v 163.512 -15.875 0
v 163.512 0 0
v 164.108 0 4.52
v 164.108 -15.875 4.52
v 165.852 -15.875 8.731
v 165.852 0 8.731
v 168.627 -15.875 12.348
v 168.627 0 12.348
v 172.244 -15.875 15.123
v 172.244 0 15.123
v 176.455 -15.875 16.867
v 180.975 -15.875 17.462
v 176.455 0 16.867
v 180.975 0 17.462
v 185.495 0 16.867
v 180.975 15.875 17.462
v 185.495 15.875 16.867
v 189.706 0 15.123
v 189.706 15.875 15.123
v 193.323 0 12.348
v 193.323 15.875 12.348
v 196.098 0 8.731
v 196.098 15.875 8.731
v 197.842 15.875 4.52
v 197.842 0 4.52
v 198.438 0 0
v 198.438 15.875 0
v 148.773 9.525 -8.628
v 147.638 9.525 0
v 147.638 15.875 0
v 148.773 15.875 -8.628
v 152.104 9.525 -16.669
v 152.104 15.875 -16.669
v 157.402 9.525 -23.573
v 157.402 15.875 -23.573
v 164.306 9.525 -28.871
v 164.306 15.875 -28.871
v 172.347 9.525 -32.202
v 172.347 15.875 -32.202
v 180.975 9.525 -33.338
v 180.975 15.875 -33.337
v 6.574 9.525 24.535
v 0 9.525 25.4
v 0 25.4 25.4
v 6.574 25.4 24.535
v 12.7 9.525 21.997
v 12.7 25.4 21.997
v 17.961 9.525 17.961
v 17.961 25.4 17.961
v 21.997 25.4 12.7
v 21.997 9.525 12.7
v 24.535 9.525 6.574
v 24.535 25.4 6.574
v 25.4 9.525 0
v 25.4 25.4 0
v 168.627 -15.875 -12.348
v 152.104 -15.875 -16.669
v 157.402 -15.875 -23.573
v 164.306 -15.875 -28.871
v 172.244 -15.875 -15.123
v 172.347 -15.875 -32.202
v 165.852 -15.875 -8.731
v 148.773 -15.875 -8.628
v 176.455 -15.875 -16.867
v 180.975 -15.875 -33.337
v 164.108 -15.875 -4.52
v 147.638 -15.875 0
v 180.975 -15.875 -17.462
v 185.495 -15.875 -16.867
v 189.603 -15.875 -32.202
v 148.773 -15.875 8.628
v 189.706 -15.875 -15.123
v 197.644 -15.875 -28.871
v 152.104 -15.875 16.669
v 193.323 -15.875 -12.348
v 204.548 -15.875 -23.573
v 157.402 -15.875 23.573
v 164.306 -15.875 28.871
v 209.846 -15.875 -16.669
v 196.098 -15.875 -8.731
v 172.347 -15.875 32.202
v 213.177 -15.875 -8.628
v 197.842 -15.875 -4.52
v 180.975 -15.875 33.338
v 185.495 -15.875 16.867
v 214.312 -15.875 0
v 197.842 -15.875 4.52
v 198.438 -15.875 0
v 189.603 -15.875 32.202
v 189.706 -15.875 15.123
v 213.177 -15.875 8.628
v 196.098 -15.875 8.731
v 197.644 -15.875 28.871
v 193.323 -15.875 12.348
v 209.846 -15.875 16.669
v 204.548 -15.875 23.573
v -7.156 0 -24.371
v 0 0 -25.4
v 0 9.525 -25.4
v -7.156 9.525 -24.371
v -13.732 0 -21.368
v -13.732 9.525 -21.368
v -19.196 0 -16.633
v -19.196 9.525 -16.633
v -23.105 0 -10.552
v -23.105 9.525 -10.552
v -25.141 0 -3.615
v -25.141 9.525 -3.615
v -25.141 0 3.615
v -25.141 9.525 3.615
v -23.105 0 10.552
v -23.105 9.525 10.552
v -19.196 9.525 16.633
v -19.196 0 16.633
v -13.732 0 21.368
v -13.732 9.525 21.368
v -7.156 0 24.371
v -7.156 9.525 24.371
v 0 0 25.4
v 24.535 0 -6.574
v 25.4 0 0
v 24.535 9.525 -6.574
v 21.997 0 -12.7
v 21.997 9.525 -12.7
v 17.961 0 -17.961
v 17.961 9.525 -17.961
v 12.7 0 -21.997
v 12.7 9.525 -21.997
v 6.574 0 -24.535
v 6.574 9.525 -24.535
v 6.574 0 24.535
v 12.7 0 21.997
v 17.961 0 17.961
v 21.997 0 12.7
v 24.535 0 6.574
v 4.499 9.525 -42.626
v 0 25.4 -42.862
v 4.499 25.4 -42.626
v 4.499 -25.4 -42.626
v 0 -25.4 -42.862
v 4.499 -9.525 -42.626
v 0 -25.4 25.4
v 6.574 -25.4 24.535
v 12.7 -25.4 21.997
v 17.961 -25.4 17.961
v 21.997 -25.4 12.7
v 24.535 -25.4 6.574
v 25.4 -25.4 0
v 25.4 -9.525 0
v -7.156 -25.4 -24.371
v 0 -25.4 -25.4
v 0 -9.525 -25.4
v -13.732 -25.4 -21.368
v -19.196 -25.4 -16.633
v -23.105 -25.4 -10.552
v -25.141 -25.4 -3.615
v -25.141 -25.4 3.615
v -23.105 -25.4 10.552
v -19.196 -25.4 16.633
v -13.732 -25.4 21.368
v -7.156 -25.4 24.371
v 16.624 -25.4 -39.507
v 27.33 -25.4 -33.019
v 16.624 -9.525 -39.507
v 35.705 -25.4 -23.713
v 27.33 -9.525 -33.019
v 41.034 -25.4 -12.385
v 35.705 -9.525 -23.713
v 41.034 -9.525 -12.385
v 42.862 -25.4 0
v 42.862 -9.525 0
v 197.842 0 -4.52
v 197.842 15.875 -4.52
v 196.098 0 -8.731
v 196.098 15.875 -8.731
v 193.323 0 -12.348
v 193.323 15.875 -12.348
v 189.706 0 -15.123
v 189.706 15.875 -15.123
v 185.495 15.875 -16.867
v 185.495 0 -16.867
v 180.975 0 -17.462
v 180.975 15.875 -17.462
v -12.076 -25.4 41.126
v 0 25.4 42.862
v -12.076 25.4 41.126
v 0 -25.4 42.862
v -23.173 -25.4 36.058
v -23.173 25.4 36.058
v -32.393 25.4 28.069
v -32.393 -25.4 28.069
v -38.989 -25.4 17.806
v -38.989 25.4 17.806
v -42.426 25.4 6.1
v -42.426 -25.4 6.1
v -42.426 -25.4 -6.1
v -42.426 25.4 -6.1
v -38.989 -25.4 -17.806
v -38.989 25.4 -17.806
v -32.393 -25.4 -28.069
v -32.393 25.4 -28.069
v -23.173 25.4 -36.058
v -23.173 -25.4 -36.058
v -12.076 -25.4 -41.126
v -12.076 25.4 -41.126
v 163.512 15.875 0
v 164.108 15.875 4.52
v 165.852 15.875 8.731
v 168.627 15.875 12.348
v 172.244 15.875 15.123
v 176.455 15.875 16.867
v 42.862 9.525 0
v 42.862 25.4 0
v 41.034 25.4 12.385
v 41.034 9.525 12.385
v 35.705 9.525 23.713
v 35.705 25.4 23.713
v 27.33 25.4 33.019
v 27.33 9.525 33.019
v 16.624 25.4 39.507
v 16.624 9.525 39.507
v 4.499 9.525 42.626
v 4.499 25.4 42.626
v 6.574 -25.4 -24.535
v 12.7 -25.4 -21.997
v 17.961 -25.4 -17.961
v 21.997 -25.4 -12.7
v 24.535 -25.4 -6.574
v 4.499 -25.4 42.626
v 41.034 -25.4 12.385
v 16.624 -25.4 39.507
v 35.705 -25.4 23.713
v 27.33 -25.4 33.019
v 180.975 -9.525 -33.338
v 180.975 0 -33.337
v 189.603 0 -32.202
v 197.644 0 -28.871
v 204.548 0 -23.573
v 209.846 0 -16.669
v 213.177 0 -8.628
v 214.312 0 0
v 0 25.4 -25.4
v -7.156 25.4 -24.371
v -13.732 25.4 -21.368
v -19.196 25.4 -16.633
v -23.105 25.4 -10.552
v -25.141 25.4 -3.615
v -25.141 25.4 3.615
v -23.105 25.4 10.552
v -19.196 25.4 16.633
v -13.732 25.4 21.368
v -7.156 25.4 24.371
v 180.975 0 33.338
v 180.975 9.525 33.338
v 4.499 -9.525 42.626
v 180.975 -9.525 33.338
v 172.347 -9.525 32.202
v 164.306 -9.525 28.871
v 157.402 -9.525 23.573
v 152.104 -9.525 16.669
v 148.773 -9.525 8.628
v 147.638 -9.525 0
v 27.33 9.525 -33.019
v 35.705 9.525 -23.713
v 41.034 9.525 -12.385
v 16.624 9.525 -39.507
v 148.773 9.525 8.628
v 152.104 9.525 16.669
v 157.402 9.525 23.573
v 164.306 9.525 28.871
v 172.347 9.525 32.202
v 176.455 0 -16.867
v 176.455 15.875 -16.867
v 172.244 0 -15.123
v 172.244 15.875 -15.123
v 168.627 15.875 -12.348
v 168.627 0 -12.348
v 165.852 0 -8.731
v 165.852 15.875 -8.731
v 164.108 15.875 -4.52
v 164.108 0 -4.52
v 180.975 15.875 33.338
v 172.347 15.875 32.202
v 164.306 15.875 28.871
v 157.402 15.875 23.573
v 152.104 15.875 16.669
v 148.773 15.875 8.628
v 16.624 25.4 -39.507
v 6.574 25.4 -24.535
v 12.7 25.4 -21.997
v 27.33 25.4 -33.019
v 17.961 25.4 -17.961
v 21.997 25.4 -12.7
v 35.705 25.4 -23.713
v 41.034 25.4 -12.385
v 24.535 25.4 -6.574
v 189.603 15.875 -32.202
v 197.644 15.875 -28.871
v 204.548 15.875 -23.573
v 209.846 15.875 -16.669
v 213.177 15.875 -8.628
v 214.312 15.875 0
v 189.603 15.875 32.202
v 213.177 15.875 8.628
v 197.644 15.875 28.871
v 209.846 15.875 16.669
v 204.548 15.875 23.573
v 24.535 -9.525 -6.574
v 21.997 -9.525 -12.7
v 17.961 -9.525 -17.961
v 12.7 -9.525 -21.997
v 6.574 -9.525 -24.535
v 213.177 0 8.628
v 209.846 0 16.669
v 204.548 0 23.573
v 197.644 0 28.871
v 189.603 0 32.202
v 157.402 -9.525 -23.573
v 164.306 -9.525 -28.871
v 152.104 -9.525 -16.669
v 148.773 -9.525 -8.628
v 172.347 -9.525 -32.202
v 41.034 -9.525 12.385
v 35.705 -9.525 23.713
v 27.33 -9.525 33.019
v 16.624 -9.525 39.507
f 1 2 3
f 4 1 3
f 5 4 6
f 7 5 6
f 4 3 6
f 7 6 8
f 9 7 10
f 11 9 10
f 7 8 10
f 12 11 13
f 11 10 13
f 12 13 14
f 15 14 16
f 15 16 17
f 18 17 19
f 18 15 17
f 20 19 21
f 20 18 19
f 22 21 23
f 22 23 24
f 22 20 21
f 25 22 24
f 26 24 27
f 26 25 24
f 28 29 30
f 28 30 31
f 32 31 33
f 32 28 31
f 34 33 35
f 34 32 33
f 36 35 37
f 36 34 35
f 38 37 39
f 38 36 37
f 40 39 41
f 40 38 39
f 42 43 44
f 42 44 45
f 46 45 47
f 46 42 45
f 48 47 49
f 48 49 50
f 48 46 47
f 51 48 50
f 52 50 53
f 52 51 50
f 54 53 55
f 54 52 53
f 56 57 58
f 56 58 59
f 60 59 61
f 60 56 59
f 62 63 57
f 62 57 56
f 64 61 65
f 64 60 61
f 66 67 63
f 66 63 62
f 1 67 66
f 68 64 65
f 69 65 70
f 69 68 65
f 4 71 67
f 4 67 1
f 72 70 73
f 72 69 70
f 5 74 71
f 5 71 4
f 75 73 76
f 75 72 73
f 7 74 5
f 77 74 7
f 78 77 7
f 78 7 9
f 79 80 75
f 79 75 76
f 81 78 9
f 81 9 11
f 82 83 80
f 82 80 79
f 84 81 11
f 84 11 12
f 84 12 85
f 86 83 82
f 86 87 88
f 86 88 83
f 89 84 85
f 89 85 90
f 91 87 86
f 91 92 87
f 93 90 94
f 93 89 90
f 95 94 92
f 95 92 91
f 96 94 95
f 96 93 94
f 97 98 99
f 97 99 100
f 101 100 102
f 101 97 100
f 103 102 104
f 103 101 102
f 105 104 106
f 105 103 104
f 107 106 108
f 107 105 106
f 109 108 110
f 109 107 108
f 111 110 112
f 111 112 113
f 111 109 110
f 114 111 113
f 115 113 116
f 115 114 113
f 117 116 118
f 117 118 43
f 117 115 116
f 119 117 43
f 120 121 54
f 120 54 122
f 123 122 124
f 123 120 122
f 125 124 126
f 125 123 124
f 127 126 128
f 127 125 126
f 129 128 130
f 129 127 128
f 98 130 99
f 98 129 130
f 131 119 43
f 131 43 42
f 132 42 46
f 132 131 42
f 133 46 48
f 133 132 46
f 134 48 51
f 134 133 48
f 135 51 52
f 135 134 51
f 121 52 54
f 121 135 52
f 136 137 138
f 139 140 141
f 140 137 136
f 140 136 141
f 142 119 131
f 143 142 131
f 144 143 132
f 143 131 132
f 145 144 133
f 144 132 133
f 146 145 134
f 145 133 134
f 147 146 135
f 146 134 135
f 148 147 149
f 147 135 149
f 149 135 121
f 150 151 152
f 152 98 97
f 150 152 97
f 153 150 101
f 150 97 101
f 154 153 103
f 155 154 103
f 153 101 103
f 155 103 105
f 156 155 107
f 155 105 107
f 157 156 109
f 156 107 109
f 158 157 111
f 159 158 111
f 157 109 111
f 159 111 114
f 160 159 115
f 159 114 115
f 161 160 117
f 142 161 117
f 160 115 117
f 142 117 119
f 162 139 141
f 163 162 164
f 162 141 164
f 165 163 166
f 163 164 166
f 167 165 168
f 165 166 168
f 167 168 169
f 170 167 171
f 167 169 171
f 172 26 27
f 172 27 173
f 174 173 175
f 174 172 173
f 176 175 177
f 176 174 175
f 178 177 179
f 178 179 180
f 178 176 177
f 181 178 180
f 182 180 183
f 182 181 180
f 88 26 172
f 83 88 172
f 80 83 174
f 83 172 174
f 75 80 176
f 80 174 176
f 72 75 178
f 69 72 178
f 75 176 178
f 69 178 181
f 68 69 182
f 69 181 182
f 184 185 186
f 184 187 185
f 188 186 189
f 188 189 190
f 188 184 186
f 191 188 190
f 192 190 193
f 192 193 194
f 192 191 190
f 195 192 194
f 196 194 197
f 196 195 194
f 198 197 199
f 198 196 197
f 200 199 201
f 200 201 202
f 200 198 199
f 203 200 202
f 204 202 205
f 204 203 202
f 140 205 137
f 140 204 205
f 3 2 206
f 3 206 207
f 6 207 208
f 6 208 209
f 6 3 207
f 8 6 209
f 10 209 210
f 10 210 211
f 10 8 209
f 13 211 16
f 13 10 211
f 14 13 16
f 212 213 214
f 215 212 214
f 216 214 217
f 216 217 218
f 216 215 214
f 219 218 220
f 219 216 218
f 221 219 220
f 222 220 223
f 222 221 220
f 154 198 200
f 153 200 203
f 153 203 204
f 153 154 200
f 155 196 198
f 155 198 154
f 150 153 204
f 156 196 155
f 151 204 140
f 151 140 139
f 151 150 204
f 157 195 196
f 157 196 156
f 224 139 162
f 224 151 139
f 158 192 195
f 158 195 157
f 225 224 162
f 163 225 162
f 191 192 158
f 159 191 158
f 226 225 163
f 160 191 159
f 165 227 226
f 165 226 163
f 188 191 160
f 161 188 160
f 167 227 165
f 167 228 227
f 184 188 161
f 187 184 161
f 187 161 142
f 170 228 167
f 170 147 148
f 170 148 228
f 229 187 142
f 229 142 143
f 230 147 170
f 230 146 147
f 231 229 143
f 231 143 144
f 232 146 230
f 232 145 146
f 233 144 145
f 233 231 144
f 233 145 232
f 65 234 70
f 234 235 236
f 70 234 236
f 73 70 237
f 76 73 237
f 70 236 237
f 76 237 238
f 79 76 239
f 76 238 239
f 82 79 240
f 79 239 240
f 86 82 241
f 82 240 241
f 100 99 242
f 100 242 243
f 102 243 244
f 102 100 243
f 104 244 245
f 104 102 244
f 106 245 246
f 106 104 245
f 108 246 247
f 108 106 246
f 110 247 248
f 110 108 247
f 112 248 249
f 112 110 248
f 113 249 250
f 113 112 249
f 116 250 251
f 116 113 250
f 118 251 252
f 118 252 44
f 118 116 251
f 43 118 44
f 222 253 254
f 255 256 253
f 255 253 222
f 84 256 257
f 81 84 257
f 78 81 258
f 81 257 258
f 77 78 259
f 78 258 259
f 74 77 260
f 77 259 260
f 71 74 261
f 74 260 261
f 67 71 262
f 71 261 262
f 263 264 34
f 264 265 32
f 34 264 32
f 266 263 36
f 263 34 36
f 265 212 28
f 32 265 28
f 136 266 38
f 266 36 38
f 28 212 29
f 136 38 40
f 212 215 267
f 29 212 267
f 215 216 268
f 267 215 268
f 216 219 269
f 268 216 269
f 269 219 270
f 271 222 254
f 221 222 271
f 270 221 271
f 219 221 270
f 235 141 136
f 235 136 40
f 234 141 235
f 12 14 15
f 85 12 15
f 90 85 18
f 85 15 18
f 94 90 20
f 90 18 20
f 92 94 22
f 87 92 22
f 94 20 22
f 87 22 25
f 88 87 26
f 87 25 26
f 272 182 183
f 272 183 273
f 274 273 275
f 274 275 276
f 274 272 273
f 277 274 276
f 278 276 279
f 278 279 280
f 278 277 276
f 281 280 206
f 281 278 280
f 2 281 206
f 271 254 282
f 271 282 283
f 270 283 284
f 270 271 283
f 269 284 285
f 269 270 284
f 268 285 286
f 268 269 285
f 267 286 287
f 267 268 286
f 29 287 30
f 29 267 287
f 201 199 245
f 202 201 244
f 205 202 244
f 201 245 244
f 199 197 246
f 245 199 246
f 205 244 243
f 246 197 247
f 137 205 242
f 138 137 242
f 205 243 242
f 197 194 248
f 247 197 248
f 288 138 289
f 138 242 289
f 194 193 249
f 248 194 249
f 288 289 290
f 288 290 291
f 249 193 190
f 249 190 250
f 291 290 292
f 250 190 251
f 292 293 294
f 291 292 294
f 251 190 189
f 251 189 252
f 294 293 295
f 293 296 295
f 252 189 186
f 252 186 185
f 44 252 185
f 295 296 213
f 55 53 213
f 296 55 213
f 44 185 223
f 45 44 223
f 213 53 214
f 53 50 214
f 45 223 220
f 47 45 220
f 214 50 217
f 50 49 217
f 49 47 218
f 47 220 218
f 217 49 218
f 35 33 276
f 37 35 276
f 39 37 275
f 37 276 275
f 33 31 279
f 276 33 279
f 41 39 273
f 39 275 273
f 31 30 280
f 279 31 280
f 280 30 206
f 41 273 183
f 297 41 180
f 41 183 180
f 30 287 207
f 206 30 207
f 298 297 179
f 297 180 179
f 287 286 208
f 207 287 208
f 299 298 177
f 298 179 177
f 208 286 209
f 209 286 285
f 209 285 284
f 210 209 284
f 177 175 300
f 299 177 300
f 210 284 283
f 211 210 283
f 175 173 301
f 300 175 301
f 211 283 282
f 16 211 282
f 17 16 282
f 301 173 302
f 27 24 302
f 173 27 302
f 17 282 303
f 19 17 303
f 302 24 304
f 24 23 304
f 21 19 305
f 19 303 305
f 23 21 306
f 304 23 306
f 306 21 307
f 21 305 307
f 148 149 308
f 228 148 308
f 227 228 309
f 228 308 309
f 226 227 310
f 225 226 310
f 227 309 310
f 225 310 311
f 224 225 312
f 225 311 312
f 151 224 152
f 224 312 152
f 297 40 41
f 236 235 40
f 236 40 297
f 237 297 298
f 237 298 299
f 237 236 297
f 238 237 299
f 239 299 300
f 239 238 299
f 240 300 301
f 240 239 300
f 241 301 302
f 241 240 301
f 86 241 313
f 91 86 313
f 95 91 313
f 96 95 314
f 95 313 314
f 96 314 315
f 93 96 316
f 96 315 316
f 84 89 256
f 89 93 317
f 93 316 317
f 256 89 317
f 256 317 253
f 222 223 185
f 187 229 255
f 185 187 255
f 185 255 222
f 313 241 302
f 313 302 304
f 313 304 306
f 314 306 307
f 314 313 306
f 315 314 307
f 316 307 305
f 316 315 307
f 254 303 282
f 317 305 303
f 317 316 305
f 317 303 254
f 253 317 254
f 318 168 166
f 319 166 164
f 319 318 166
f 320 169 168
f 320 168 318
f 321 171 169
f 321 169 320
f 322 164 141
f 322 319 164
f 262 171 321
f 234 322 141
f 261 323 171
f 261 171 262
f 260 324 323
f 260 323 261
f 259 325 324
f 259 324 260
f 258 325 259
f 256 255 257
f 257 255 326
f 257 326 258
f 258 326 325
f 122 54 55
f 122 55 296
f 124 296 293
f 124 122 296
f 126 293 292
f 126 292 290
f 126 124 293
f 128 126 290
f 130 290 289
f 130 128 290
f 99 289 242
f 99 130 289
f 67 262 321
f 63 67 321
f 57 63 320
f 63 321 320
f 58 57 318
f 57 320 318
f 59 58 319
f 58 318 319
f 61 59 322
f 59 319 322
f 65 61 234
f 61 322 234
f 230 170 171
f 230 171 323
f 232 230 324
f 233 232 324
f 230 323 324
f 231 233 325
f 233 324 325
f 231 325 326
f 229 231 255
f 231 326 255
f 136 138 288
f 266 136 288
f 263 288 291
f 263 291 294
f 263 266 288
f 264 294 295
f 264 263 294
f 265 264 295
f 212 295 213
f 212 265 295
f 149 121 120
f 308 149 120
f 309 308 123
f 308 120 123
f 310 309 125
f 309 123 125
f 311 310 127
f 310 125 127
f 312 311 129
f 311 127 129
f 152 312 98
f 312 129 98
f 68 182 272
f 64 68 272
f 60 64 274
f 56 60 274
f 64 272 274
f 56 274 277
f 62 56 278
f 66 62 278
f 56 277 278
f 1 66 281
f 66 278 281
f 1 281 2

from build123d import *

# Parameters (mm, degrees)
F1_DEPTH = 25.4
F2_DEPTH = 25.4
F3_DEPTH = 9.525
F4_DEPTH = 9.525
F5_DEPTH = 15.875
F6_DEPTH = 15.875


with BuildPart() as f1:
    # F0 (on Front) → F1 (new body)
    with BuildSketch(Plane.XZ):
        with BuildLine():
            Line((0, 25.4), (0, 42.8625))
            ThreePointArc((0, 42.8625), (-42.8625, 0), (0, -42.8625))
            Line((0, -42.8625), (0, -25.4))
            ThreePointArc((0, -25.4), (-25.4, 0), (0, 25.4))
        make_face()
        with BuildLine():
            Line((4.499378453, 42.6256906077), (0, 42.8625))
            Line((0, 42.8625), (0, 25.4))
            ThreePointArc((0, 25.4), (17.9605122421, 17.9605122421), (25.4, 0))
            Line((25.4, 0), (42.8625, 0))
            ThreePointArc((42.8625, 0), (31.8594453435, 28.6735008092), (4.499378453, 42.6256906077))
        make_face()
        with BuildLine():
            Line((0, -25.4), (0, -42.8625))
            Line((0, -42.8625), (4.499378453, -42.6256906077))
            ThreePointArc((4.499378453, -42.6256906077), (31.8594453435, -28.6735008092), (42.8625, 0))
            Line((42.8625, 0), (25.4, 0))
            ThreePointArc((25.4, 0), (17.9605122421, -17.9605122421), (0, -25.4))
        make_face()
    extrude(amount=F1_DEPTH)

    # F2 (add): a face of the model
    f2_faces = [f1.faces().sort_by_distance(p)[0] for p in [
        (-41.6501654237, 0, 0),
    ]]
    extrude(f2_faces, amount=F2_DEPTH)

    # F0 (on Front) → F3 (join)
    with BuildSketch(Plane.XZ):
        with BuildLine():
            Line((0, -25.4), (0, -42.8625))
            Line((0, -42.8625), (4.499378453, -42.6256906077))
            ThreePointArc((4.499378453, -42.6256906077), (31.8594453435, -28.6735008092), (42.8625, 0))
            Line((42.8625, 0), (25.4, 0))
            ThreePointArc((25.4, 0), (17.9605122421, -17.9605122421), (0, -25.4))
        make_face()
        with BuildLine():
            Line((180.975, 33.3375), (4.499378453, 42.6256906077))
            ThreePointArc((4.499378453, 42.6256906077), (31.8594453435, 28.6735008092), (42.8625, 0))
            Line((42.8625, 0), (147.6375, 0))
            ThreePointArc((147.6375, 0), (157.4018276822, 23.5731723178), (180.975, 33.3375))
        make_face()
        with BuildLine():
            ThreePointArc((42.8625, 0), (31.8594453435, -28.6735008092), (4.499378453, -42.6256906077))
            Line((4.499378453, -42.6256906077), (180.975, -33.3375))
            ThreePointArc((180.975, -33.3375), (157.4018276822, -23.5731723178), (147.6375, 0))
            Line((147.6375, 0), (42.8625, 0))
        make_face()
    extrude(amount=F3_DEPTH)

    # F0 (on Front) → F4 (join)
    with BuildSketch(Plane.XZ):
        with BuildLine():
            Line((0, 25.4), (0, 42.8625))
            ThreePointArc((0, 42.8625), (-42.8625, 0), (0, -42.8625))
            Line((0, -42.8625), (0, -25.4))
            ThreePointArc((0, -25.4), (-25.4, 0), (0, 25.4))
        make_face()
        with BuildLine():
            Line((4.499378453, 42.6256906077), (0, 42.8625))
            Line((0, 42.8625), (0, 25.4))
            ThreePointArc((0, 25.4), (17.9605122421, 17.9605122421), (25.4, 0))
            Line((25.4, 0), (42.8625, 0))
            ThreePointArc((42.8625, 0), (31.8594453435, 28.6735008092), (4.499378453, 42.6256906077))
        make_face()
        with BuildLine():
            Line((0, -25.4), (0, -42.8625))
            Line((0, -42.8625), (4.499378453, -42.6256906077))
            ThreePointArc((4.499378453, -42.6256906077), (31.8594453435, -28.6735008092), (42.8625, 0))
            Line((42.8625, 0), (25.4, 0))
            ThreePointArc((25.4, 0), (17.9605122421, -17.9605122421), (0, -25.4))
        make_face()
        with BuildLine():
            Line((180.975, 33.3375), (4.499378453, 42.6256906077))
            ThreePointArc((4.499378453, 42.6256906077), (31.8594453435, 28.6735008092), (42.8625, 0))
            Line((42.8625, 0), (147.6375, 0))
            ThreePointArc((147.6375, 0), (157.4018276822, 23.5731723178), (180.975, 33.3375))
        make_face()
        with BuildLine():
            ThreePointArc((42.8625, 0), (31.8594453435, -28.6735008092), (4.499378453, -42.6256906077))
            Line((4.499378453, -42.6256906077), (180.975, -33.3375))
            ThreePointArc((180.975, -33.3375), (157.4018276822, -23.5731723178), (147.6375, 0))
            Line((147.6375, 0), (42.8625, 0))
        make_face()
    extrude(amount=-F4_DEPTH)

    # F0 (on Front) → F5 (join)
    with BuildSketch(Plane.XZ):
        with BuildLine():
            ThreePointArc((147.6375, 0), (157.4018276822, -23.5731723178), (180.975, -33.3375))
            Line((180.975, -33.3375), (180.975, -17.4625))
            ThreePointArc((180.975, -17.4625), (168.6271478335, -12.3478521665), (163.5125, 0))
            Line((163.5125, 0), (147.6375, 0))
        make_face()
        with BuildLine():
            Line((180.975, 17.4625), (180.975, 33.3375))
            ThreePointArc((180.975, 33.3375), (157.4018276822, 23.5731723178), (147.6375, 0))
            Line((147.6375, 0), (163.5125, 0))
            ThreePointArc((163.5125, 0), (168.6271478335, 12.3478521665), (180.975, 17.4625))
        make_face()
        with BuildLine():
            ThreePointArc((214.3125, 0), (204.5481723178, 23.5731723178), (180.975, 33.3375))
            Line((180.975, 33.3375), (180.975, 17.4625))
            ThreePointArc((180.975, 17.4625), (193.3228521665, 12.3478521665), (198.4375, 0))
            ThreePointArc((198.4375, 0), (193.3228521665, -12.3478521665), (180.975, -17.4625))
            Line((180.975, -17.4625), (180.975, -33.3375))
            ThreePointArc((180.975, -33.3375), (204.5481723178, -23.5731723178), (214.3125, 0))
        make_face()
    extrude(amount=F5_DEPTH)

    # F0 (on Front) → F6 (join)
    with BuildSketch(Plane.XZ):
        with BuildLine():
            ThreePointArc((147.6375, 0), (157.4018276822, -23.5731723178), (180.975, -33.3375))
            Line((180.975, -33.3375), (180.975, -17.4625))
            ThreePointArc((180.975, -17.4625), (168.6271478335, -12.3478521665), (163.5125, 0))
            Line((163.5125, 0), (147.6375, 0))
        make_face()
        with BuildLine():
            Line((180.975, 17.4625), (180.975, 33.3375))
            ThreePointArc((180.975, 33.3375), (157.4018276822, 23.5731723178), (147.6375, 0))
            Line((147.6375, 0), (163.5125, 0))
            ThreePointArc((163.5125, 0), (168.6271478335, 12.3478521665), (180.975, 17.4625))
        make_face()
        with BuildLine():
            ThreePointArc((214.3125, 0), (204.5481723178, 23.5731723178), (180.975, 33.3375))
            Line((180.975, 33.3375), (180.975, 17.4625))
            ThreePointArc((180.975, 17.4625), (193.3228521665, 12.3478521665), (198.4375, 0))
            ThreePointArc((198.4375, 0), (193.3228521665, -12.3478521665), (180.975, -17.4625))
            Line((180.975, -17.4625), (180.975, -33.3375))
            ThreePointArc((180.975, -33.3375), (204.5481723178, -23.5731723178), (214.3125, 0))
        make_face()
    extrude(amount=-F6_DEPTH)


solid = f1.part
